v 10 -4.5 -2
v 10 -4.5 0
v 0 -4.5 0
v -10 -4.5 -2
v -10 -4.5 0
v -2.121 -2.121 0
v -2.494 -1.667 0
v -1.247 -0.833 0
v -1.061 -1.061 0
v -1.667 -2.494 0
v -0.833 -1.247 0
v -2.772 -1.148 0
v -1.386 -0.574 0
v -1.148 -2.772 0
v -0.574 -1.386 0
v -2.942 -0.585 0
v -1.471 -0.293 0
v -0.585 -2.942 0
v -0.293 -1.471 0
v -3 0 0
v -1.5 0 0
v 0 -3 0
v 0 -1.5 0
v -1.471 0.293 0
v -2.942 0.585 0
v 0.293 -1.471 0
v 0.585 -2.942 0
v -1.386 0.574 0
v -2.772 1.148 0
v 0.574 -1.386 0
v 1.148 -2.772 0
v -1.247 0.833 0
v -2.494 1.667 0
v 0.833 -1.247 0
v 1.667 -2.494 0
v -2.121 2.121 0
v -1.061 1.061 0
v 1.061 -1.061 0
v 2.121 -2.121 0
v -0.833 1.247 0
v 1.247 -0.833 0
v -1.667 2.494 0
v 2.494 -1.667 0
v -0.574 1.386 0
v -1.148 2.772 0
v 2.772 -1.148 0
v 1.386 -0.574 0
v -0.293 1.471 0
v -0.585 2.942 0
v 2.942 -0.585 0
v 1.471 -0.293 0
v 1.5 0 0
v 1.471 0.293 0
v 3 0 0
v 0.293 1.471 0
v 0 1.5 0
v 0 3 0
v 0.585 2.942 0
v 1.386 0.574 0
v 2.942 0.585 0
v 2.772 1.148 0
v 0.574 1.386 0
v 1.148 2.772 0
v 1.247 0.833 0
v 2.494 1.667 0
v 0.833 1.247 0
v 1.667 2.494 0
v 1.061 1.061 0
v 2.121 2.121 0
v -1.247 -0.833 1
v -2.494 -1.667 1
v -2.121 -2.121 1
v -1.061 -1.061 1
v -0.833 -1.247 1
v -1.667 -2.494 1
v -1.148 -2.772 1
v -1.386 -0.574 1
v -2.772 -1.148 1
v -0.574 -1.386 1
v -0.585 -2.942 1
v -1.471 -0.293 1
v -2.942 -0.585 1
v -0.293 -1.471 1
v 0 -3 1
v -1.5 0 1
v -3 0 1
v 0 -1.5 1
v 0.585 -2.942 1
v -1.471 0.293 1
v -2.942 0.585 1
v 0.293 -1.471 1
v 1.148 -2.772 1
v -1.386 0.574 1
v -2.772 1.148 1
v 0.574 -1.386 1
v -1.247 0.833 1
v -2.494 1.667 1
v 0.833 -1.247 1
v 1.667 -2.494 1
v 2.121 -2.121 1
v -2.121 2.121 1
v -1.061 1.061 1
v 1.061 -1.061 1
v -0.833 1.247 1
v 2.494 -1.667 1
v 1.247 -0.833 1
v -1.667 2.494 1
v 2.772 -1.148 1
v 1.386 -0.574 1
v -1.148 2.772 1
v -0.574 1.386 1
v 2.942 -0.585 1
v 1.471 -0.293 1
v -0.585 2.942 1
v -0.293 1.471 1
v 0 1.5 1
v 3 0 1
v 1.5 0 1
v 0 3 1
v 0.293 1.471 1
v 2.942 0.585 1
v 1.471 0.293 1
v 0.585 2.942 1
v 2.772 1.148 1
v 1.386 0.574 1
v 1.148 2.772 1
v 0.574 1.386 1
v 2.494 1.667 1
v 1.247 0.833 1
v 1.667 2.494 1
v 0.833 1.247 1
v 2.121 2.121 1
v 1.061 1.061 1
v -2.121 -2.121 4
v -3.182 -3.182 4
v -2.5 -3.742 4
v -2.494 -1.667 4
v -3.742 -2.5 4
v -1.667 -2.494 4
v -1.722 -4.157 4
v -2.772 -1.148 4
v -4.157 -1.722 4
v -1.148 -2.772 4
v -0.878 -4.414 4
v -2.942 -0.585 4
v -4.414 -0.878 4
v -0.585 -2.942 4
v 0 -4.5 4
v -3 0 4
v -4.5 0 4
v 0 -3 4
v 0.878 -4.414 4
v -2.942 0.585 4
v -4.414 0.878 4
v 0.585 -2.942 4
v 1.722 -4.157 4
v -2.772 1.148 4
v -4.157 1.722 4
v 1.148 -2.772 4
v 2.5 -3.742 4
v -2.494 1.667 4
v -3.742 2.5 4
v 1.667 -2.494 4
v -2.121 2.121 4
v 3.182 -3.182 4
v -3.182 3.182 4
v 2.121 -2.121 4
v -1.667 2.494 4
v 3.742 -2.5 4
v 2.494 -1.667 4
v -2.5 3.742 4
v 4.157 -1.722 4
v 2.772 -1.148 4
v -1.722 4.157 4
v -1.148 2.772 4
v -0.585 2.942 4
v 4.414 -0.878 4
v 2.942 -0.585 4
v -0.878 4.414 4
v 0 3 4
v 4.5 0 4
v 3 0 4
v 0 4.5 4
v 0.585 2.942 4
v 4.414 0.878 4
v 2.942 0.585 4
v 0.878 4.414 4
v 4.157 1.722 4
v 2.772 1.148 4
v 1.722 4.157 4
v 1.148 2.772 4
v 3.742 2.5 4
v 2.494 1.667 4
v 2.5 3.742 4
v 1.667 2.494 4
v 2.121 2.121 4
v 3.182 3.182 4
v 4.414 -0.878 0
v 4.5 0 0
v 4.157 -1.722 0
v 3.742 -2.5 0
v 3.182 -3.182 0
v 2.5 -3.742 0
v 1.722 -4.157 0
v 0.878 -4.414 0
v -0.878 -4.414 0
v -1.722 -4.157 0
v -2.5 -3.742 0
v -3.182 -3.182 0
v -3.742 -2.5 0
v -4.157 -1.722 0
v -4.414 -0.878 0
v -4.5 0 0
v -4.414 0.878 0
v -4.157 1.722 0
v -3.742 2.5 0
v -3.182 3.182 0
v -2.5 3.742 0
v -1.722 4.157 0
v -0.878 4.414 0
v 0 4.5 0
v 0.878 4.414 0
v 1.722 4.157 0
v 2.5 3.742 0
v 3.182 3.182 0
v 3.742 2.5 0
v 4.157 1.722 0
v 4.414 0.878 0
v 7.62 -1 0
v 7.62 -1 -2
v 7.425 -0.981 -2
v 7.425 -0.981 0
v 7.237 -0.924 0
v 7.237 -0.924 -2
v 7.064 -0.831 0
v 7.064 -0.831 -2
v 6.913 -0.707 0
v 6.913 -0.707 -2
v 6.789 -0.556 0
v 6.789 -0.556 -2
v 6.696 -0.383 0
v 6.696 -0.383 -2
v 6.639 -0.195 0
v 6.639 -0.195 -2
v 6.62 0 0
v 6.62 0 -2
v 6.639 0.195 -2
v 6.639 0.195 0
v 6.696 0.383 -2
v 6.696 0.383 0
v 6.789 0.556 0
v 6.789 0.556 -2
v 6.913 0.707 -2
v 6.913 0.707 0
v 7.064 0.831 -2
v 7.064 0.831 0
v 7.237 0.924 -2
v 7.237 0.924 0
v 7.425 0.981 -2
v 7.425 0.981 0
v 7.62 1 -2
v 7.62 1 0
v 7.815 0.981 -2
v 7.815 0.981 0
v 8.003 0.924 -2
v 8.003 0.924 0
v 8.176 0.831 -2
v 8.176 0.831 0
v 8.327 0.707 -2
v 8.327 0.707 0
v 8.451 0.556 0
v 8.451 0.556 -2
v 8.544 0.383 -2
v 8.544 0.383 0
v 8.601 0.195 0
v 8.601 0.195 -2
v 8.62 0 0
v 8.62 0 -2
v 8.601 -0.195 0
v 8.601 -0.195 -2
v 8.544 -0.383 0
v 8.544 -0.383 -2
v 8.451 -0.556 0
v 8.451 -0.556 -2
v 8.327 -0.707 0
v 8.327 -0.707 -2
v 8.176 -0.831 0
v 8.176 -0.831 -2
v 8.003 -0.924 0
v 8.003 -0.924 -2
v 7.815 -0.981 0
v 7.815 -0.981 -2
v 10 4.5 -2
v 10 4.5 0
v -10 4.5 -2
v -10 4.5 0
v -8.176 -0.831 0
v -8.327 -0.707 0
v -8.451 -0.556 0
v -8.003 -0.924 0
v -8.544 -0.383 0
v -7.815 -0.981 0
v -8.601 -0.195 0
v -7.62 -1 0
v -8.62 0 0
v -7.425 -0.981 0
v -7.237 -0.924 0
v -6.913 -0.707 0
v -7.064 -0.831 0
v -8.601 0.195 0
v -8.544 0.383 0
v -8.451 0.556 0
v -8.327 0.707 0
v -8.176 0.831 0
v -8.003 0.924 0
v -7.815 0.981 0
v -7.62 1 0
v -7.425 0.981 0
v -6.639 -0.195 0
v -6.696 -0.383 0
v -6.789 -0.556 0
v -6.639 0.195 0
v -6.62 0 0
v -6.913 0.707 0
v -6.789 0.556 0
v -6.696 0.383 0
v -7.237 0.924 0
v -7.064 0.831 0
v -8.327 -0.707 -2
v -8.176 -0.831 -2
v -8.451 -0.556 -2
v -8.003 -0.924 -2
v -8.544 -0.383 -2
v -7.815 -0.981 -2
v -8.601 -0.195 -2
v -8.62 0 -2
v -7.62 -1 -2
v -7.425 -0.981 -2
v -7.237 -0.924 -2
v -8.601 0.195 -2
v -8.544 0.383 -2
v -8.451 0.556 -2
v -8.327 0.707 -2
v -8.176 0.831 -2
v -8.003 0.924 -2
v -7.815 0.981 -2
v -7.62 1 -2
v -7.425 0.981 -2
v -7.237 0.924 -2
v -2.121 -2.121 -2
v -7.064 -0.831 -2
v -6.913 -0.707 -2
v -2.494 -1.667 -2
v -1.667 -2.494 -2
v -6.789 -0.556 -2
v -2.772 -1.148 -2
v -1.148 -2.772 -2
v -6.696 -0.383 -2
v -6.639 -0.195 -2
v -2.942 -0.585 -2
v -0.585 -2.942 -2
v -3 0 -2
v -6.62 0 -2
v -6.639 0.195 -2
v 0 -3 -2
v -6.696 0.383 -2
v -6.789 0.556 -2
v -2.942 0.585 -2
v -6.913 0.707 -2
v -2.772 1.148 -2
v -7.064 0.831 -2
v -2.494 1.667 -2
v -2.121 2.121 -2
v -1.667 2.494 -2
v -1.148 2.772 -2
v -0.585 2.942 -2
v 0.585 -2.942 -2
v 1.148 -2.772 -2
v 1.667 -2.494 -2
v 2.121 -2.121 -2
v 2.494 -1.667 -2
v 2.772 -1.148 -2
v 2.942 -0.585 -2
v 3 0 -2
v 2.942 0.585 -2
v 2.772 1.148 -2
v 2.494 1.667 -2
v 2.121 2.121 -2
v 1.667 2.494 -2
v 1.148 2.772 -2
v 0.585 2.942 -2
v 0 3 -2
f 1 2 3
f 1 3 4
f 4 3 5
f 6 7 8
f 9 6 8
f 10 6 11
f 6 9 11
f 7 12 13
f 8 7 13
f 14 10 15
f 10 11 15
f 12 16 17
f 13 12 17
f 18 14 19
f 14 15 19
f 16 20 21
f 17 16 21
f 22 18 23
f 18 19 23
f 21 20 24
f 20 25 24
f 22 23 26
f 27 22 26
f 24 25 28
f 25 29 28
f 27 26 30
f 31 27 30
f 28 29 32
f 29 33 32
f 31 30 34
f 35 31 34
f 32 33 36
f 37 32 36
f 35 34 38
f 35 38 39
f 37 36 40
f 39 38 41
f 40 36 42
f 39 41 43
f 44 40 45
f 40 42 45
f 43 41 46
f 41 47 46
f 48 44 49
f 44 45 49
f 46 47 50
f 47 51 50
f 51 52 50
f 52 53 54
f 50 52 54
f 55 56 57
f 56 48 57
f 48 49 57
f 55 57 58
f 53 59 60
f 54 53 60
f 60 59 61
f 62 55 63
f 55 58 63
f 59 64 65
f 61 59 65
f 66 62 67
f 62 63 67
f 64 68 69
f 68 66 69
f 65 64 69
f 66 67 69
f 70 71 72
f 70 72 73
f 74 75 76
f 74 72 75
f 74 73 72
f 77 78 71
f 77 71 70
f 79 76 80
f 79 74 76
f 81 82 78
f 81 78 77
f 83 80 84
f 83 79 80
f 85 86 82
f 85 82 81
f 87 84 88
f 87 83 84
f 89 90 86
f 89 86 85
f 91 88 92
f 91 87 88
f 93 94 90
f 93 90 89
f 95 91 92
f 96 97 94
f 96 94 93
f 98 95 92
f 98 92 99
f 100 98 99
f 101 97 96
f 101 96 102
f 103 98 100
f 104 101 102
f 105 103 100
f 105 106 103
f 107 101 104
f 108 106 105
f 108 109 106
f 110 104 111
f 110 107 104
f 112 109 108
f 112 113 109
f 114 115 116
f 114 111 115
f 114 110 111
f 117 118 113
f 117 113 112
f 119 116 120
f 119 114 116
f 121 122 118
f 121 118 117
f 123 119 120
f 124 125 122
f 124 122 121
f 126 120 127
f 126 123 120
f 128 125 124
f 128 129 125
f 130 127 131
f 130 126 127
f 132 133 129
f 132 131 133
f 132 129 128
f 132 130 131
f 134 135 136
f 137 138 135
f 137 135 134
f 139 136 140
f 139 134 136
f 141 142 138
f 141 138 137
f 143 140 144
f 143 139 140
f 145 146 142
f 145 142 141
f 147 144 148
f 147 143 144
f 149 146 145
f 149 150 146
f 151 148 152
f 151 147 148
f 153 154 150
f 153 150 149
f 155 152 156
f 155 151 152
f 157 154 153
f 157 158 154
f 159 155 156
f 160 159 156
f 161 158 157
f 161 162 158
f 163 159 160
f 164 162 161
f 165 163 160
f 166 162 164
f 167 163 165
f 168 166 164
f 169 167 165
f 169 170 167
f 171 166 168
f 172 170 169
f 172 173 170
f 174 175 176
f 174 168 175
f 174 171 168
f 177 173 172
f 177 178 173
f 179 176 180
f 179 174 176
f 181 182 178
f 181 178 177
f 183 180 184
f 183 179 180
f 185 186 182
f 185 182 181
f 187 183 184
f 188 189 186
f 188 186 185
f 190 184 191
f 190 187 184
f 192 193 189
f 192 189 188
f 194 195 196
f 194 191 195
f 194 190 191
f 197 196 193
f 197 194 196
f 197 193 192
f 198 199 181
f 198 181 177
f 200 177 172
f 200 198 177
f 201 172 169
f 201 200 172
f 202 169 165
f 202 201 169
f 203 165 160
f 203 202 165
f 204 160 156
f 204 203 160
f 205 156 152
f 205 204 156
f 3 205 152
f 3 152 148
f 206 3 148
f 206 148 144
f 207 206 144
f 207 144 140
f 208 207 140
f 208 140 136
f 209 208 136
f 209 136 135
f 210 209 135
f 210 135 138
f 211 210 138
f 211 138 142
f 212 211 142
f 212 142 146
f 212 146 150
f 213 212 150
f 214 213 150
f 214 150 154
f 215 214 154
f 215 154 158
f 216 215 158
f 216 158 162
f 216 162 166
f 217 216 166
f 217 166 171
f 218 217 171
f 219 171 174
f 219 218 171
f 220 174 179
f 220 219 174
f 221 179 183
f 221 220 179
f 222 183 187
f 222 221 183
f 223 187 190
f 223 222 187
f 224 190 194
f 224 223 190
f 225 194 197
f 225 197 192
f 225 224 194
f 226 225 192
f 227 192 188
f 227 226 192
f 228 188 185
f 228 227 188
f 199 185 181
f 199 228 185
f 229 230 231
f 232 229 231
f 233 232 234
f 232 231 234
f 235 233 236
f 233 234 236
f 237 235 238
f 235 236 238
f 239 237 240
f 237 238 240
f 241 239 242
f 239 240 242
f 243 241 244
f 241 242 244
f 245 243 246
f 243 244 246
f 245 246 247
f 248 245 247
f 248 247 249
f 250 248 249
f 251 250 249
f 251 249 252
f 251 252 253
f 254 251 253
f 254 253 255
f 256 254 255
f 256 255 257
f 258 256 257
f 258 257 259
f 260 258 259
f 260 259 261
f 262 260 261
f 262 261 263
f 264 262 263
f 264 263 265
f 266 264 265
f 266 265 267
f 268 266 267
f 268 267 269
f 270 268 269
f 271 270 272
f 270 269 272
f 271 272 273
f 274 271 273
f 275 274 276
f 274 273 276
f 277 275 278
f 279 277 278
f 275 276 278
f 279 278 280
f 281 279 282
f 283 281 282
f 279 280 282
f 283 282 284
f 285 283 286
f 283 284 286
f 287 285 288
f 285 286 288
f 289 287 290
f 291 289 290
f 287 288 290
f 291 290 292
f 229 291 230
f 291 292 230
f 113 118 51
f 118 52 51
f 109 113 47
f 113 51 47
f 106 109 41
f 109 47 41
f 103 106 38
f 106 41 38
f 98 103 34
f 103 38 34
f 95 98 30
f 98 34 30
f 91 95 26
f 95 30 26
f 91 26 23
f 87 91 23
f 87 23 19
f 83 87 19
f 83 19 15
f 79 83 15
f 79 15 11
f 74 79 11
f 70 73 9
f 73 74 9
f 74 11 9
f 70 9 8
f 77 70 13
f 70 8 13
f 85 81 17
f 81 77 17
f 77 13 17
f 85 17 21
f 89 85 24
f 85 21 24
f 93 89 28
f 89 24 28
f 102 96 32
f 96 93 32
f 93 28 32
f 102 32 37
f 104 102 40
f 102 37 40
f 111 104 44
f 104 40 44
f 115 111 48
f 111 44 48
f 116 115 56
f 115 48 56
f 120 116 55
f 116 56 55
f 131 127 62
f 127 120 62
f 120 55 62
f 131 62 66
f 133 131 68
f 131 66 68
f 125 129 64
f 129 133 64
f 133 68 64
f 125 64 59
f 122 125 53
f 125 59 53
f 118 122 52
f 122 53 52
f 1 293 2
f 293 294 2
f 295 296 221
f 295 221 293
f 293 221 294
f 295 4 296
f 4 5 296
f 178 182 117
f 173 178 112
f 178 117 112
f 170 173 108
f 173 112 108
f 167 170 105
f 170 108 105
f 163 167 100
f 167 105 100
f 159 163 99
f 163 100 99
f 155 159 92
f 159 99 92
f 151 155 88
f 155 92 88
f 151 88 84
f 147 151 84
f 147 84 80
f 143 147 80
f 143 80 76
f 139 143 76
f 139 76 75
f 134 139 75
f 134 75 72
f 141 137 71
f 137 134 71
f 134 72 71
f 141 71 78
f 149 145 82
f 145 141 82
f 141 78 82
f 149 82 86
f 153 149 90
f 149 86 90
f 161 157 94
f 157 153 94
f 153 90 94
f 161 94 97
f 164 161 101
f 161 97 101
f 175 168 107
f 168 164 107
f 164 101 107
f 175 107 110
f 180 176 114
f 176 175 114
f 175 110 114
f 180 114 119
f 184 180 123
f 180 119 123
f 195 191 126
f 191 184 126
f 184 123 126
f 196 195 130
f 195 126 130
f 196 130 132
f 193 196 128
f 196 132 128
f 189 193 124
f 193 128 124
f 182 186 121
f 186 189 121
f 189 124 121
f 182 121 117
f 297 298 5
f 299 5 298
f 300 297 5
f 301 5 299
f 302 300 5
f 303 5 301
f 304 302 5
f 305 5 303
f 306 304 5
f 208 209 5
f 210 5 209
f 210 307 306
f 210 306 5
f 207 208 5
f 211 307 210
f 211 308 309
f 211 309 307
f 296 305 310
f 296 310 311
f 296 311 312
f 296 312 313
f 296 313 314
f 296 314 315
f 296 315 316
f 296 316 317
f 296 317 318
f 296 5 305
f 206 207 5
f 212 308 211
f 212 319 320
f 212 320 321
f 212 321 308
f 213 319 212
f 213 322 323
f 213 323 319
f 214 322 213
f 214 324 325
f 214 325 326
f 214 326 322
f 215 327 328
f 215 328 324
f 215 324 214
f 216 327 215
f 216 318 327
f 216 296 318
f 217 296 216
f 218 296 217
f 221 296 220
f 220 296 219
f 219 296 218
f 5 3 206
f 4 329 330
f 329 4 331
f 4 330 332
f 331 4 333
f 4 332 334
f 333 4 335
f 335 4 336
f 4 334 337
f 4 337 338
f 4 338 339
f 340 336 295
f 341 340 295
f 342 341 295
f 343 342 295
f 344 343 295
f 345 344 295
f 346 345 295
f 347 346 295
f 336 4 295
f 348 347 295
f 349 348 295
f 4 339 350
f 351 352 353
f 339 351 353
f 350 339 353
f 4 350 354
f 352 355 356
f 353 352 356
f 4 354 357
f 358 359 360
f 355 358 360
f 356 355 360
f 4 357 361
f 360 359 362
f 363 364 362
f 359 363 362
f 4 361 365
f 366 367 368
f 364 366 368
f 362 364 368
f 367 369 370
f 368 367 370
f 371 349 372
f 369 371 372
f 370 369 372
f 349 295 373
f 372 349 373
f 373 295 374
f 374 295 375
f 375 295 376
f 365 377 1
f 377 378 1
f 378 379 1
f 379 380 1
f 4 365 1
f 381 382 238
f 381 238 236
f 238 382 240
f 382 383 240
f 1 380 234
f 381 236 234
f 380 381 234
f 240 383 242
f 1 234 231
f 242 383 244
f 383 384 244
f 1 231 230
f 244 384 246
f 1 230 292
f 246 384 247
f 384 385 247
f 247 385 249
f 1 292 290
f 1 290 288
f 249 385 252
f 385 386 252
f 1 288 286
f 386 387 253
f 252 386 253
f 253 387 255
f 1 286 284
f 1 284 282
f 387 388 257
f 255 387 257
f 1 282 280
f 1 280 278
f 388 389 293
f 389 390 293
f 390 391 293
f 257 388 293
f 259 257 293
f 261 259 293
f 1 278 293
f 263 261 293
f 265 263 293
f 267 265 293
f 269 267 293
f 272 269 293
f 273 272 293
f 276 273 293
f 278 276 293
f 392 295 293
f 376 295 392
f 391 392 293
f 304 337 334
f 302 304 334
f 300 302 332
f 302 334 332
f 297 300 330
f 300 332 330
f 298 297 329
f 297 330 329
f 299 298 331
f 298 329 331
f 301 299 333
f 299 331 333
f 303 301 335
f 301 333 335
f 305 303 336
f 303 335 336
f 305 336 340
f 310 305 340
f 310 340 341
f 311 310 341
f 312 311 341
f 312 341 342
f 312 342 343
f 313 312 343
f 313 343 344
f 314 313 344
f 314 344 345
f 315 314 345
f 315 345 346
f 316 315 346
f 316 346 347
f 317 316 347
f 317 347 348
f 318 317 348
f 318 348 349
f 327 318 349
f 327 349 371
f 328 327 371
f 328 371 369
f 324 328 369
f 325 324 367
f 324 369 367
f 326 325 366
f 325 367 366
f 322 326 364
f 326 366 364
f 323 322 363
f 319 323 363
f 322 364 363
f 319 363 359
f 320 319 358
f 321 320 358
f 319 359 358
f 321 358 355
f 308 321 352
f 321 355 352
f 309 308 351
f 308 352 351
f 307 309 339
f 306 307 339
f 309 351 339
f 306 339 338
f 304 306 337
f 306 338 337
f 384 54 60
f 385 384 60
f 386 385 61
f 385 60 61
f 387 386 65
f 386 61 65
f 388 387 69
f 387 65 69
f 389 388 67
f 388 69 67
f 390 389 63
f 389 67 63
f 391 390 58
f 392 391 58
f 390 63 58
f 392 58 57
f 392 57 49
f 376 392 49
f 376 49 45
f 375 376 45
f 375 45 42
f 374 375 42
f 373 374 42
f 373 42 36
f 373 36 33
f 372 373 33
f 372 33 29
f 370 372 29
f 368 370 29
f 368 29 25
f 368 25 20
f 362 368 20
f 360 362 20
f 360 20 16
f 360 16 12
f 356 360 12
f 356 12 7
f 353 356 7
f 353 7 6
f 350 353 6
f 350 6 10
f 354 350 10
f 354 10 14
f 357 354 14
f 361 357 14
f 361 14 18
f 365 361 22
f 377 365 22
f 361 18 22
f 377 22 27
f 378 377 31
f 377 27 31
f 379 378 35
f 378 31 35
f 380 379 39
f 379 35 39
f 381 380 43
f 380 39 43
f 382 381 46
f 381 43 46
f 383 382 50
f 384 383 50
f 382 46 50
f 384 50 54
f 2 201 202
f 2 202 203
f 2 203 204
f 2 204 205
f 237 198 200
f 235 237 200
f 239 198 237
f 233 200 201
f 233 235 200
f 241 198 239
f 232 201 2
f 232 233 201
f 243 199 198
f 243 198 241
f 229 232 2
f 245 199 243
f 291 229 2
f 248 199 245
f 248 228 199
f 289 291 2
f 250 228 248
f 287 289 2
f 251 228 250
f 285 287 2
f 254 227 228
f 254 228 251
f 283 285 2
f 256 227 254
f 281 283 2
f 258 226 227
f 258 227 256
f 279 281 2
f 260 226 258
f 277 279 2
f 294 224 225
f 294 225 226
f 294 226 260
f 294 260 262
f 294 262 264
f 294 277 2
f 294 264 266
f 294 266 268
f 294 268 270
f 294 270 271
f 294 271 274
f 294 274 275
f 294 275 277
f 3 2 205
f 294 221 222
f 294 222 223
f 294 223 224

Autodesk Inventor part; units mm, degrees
ref_plane "YZ Plane" through (0, 0, 0) normal (1, 0, 0) x (0, 1, 0)
ref_plane "XZ Plane" through (0, 0, 0) normal (0, 1, 0) x (-1, 0, 0)
ref_plane "XY Plane" through (0, 0, 0) normal (0, 0, 1) x (1, 0, 0)
sketch "Sketch1" plane through (0, 0, 0) normal (0, 0, 1) x (1, 0, 0)
  circle A0 centre (0, 0) radius 3
  circle A1 centre (0, 0) radius 4.5
  line L0 (0, 0) -> (7.62, 0) construction
  line L1 (0, 0) -> (-7.62, 0) construction
  line L2 (10, -4.5) -> (-10, -4.5)
  line L3 (-10, -4.5) -> (-10, 4.5)
  line L4 (-10, 4.5) -> (10, 4.5)
  line L5 (10, 4.5) -> (10, -4.5)
  line L6 (10, -4.5) -> (-10, 4.5) construction
  line L7 (-10, -4.5) -> (10, 4.5) construction
  circle A2 centre (0, 0) radius 1.5
  dimension "d0" = 6
  dimension "d1" = 9
  dimension "d2" = 7.62
  dimension "d3" = 7.62
  dimension "d4" = 20
  dimension "d5" = 9
  dimension "d8" = 3
extrude "Extrusion1" add sketch "Sketch1" against normal blind 2 contours A1 | A1 L4 L5 L2 | A1 L2 L3 L4
extrude "Extrusion2" add sketch "Sketch1" along normal blind 1 contours A0 | A1
extrude "Extrusion3" add sketch "Sketch1" along normal blind 4 contours A1
hole "Hole1" at (-7.62, 0, 0) at (7.62, 0, 0) direction (0, 0, -1) diameter 2 end through all
properties part number "orczyk"
